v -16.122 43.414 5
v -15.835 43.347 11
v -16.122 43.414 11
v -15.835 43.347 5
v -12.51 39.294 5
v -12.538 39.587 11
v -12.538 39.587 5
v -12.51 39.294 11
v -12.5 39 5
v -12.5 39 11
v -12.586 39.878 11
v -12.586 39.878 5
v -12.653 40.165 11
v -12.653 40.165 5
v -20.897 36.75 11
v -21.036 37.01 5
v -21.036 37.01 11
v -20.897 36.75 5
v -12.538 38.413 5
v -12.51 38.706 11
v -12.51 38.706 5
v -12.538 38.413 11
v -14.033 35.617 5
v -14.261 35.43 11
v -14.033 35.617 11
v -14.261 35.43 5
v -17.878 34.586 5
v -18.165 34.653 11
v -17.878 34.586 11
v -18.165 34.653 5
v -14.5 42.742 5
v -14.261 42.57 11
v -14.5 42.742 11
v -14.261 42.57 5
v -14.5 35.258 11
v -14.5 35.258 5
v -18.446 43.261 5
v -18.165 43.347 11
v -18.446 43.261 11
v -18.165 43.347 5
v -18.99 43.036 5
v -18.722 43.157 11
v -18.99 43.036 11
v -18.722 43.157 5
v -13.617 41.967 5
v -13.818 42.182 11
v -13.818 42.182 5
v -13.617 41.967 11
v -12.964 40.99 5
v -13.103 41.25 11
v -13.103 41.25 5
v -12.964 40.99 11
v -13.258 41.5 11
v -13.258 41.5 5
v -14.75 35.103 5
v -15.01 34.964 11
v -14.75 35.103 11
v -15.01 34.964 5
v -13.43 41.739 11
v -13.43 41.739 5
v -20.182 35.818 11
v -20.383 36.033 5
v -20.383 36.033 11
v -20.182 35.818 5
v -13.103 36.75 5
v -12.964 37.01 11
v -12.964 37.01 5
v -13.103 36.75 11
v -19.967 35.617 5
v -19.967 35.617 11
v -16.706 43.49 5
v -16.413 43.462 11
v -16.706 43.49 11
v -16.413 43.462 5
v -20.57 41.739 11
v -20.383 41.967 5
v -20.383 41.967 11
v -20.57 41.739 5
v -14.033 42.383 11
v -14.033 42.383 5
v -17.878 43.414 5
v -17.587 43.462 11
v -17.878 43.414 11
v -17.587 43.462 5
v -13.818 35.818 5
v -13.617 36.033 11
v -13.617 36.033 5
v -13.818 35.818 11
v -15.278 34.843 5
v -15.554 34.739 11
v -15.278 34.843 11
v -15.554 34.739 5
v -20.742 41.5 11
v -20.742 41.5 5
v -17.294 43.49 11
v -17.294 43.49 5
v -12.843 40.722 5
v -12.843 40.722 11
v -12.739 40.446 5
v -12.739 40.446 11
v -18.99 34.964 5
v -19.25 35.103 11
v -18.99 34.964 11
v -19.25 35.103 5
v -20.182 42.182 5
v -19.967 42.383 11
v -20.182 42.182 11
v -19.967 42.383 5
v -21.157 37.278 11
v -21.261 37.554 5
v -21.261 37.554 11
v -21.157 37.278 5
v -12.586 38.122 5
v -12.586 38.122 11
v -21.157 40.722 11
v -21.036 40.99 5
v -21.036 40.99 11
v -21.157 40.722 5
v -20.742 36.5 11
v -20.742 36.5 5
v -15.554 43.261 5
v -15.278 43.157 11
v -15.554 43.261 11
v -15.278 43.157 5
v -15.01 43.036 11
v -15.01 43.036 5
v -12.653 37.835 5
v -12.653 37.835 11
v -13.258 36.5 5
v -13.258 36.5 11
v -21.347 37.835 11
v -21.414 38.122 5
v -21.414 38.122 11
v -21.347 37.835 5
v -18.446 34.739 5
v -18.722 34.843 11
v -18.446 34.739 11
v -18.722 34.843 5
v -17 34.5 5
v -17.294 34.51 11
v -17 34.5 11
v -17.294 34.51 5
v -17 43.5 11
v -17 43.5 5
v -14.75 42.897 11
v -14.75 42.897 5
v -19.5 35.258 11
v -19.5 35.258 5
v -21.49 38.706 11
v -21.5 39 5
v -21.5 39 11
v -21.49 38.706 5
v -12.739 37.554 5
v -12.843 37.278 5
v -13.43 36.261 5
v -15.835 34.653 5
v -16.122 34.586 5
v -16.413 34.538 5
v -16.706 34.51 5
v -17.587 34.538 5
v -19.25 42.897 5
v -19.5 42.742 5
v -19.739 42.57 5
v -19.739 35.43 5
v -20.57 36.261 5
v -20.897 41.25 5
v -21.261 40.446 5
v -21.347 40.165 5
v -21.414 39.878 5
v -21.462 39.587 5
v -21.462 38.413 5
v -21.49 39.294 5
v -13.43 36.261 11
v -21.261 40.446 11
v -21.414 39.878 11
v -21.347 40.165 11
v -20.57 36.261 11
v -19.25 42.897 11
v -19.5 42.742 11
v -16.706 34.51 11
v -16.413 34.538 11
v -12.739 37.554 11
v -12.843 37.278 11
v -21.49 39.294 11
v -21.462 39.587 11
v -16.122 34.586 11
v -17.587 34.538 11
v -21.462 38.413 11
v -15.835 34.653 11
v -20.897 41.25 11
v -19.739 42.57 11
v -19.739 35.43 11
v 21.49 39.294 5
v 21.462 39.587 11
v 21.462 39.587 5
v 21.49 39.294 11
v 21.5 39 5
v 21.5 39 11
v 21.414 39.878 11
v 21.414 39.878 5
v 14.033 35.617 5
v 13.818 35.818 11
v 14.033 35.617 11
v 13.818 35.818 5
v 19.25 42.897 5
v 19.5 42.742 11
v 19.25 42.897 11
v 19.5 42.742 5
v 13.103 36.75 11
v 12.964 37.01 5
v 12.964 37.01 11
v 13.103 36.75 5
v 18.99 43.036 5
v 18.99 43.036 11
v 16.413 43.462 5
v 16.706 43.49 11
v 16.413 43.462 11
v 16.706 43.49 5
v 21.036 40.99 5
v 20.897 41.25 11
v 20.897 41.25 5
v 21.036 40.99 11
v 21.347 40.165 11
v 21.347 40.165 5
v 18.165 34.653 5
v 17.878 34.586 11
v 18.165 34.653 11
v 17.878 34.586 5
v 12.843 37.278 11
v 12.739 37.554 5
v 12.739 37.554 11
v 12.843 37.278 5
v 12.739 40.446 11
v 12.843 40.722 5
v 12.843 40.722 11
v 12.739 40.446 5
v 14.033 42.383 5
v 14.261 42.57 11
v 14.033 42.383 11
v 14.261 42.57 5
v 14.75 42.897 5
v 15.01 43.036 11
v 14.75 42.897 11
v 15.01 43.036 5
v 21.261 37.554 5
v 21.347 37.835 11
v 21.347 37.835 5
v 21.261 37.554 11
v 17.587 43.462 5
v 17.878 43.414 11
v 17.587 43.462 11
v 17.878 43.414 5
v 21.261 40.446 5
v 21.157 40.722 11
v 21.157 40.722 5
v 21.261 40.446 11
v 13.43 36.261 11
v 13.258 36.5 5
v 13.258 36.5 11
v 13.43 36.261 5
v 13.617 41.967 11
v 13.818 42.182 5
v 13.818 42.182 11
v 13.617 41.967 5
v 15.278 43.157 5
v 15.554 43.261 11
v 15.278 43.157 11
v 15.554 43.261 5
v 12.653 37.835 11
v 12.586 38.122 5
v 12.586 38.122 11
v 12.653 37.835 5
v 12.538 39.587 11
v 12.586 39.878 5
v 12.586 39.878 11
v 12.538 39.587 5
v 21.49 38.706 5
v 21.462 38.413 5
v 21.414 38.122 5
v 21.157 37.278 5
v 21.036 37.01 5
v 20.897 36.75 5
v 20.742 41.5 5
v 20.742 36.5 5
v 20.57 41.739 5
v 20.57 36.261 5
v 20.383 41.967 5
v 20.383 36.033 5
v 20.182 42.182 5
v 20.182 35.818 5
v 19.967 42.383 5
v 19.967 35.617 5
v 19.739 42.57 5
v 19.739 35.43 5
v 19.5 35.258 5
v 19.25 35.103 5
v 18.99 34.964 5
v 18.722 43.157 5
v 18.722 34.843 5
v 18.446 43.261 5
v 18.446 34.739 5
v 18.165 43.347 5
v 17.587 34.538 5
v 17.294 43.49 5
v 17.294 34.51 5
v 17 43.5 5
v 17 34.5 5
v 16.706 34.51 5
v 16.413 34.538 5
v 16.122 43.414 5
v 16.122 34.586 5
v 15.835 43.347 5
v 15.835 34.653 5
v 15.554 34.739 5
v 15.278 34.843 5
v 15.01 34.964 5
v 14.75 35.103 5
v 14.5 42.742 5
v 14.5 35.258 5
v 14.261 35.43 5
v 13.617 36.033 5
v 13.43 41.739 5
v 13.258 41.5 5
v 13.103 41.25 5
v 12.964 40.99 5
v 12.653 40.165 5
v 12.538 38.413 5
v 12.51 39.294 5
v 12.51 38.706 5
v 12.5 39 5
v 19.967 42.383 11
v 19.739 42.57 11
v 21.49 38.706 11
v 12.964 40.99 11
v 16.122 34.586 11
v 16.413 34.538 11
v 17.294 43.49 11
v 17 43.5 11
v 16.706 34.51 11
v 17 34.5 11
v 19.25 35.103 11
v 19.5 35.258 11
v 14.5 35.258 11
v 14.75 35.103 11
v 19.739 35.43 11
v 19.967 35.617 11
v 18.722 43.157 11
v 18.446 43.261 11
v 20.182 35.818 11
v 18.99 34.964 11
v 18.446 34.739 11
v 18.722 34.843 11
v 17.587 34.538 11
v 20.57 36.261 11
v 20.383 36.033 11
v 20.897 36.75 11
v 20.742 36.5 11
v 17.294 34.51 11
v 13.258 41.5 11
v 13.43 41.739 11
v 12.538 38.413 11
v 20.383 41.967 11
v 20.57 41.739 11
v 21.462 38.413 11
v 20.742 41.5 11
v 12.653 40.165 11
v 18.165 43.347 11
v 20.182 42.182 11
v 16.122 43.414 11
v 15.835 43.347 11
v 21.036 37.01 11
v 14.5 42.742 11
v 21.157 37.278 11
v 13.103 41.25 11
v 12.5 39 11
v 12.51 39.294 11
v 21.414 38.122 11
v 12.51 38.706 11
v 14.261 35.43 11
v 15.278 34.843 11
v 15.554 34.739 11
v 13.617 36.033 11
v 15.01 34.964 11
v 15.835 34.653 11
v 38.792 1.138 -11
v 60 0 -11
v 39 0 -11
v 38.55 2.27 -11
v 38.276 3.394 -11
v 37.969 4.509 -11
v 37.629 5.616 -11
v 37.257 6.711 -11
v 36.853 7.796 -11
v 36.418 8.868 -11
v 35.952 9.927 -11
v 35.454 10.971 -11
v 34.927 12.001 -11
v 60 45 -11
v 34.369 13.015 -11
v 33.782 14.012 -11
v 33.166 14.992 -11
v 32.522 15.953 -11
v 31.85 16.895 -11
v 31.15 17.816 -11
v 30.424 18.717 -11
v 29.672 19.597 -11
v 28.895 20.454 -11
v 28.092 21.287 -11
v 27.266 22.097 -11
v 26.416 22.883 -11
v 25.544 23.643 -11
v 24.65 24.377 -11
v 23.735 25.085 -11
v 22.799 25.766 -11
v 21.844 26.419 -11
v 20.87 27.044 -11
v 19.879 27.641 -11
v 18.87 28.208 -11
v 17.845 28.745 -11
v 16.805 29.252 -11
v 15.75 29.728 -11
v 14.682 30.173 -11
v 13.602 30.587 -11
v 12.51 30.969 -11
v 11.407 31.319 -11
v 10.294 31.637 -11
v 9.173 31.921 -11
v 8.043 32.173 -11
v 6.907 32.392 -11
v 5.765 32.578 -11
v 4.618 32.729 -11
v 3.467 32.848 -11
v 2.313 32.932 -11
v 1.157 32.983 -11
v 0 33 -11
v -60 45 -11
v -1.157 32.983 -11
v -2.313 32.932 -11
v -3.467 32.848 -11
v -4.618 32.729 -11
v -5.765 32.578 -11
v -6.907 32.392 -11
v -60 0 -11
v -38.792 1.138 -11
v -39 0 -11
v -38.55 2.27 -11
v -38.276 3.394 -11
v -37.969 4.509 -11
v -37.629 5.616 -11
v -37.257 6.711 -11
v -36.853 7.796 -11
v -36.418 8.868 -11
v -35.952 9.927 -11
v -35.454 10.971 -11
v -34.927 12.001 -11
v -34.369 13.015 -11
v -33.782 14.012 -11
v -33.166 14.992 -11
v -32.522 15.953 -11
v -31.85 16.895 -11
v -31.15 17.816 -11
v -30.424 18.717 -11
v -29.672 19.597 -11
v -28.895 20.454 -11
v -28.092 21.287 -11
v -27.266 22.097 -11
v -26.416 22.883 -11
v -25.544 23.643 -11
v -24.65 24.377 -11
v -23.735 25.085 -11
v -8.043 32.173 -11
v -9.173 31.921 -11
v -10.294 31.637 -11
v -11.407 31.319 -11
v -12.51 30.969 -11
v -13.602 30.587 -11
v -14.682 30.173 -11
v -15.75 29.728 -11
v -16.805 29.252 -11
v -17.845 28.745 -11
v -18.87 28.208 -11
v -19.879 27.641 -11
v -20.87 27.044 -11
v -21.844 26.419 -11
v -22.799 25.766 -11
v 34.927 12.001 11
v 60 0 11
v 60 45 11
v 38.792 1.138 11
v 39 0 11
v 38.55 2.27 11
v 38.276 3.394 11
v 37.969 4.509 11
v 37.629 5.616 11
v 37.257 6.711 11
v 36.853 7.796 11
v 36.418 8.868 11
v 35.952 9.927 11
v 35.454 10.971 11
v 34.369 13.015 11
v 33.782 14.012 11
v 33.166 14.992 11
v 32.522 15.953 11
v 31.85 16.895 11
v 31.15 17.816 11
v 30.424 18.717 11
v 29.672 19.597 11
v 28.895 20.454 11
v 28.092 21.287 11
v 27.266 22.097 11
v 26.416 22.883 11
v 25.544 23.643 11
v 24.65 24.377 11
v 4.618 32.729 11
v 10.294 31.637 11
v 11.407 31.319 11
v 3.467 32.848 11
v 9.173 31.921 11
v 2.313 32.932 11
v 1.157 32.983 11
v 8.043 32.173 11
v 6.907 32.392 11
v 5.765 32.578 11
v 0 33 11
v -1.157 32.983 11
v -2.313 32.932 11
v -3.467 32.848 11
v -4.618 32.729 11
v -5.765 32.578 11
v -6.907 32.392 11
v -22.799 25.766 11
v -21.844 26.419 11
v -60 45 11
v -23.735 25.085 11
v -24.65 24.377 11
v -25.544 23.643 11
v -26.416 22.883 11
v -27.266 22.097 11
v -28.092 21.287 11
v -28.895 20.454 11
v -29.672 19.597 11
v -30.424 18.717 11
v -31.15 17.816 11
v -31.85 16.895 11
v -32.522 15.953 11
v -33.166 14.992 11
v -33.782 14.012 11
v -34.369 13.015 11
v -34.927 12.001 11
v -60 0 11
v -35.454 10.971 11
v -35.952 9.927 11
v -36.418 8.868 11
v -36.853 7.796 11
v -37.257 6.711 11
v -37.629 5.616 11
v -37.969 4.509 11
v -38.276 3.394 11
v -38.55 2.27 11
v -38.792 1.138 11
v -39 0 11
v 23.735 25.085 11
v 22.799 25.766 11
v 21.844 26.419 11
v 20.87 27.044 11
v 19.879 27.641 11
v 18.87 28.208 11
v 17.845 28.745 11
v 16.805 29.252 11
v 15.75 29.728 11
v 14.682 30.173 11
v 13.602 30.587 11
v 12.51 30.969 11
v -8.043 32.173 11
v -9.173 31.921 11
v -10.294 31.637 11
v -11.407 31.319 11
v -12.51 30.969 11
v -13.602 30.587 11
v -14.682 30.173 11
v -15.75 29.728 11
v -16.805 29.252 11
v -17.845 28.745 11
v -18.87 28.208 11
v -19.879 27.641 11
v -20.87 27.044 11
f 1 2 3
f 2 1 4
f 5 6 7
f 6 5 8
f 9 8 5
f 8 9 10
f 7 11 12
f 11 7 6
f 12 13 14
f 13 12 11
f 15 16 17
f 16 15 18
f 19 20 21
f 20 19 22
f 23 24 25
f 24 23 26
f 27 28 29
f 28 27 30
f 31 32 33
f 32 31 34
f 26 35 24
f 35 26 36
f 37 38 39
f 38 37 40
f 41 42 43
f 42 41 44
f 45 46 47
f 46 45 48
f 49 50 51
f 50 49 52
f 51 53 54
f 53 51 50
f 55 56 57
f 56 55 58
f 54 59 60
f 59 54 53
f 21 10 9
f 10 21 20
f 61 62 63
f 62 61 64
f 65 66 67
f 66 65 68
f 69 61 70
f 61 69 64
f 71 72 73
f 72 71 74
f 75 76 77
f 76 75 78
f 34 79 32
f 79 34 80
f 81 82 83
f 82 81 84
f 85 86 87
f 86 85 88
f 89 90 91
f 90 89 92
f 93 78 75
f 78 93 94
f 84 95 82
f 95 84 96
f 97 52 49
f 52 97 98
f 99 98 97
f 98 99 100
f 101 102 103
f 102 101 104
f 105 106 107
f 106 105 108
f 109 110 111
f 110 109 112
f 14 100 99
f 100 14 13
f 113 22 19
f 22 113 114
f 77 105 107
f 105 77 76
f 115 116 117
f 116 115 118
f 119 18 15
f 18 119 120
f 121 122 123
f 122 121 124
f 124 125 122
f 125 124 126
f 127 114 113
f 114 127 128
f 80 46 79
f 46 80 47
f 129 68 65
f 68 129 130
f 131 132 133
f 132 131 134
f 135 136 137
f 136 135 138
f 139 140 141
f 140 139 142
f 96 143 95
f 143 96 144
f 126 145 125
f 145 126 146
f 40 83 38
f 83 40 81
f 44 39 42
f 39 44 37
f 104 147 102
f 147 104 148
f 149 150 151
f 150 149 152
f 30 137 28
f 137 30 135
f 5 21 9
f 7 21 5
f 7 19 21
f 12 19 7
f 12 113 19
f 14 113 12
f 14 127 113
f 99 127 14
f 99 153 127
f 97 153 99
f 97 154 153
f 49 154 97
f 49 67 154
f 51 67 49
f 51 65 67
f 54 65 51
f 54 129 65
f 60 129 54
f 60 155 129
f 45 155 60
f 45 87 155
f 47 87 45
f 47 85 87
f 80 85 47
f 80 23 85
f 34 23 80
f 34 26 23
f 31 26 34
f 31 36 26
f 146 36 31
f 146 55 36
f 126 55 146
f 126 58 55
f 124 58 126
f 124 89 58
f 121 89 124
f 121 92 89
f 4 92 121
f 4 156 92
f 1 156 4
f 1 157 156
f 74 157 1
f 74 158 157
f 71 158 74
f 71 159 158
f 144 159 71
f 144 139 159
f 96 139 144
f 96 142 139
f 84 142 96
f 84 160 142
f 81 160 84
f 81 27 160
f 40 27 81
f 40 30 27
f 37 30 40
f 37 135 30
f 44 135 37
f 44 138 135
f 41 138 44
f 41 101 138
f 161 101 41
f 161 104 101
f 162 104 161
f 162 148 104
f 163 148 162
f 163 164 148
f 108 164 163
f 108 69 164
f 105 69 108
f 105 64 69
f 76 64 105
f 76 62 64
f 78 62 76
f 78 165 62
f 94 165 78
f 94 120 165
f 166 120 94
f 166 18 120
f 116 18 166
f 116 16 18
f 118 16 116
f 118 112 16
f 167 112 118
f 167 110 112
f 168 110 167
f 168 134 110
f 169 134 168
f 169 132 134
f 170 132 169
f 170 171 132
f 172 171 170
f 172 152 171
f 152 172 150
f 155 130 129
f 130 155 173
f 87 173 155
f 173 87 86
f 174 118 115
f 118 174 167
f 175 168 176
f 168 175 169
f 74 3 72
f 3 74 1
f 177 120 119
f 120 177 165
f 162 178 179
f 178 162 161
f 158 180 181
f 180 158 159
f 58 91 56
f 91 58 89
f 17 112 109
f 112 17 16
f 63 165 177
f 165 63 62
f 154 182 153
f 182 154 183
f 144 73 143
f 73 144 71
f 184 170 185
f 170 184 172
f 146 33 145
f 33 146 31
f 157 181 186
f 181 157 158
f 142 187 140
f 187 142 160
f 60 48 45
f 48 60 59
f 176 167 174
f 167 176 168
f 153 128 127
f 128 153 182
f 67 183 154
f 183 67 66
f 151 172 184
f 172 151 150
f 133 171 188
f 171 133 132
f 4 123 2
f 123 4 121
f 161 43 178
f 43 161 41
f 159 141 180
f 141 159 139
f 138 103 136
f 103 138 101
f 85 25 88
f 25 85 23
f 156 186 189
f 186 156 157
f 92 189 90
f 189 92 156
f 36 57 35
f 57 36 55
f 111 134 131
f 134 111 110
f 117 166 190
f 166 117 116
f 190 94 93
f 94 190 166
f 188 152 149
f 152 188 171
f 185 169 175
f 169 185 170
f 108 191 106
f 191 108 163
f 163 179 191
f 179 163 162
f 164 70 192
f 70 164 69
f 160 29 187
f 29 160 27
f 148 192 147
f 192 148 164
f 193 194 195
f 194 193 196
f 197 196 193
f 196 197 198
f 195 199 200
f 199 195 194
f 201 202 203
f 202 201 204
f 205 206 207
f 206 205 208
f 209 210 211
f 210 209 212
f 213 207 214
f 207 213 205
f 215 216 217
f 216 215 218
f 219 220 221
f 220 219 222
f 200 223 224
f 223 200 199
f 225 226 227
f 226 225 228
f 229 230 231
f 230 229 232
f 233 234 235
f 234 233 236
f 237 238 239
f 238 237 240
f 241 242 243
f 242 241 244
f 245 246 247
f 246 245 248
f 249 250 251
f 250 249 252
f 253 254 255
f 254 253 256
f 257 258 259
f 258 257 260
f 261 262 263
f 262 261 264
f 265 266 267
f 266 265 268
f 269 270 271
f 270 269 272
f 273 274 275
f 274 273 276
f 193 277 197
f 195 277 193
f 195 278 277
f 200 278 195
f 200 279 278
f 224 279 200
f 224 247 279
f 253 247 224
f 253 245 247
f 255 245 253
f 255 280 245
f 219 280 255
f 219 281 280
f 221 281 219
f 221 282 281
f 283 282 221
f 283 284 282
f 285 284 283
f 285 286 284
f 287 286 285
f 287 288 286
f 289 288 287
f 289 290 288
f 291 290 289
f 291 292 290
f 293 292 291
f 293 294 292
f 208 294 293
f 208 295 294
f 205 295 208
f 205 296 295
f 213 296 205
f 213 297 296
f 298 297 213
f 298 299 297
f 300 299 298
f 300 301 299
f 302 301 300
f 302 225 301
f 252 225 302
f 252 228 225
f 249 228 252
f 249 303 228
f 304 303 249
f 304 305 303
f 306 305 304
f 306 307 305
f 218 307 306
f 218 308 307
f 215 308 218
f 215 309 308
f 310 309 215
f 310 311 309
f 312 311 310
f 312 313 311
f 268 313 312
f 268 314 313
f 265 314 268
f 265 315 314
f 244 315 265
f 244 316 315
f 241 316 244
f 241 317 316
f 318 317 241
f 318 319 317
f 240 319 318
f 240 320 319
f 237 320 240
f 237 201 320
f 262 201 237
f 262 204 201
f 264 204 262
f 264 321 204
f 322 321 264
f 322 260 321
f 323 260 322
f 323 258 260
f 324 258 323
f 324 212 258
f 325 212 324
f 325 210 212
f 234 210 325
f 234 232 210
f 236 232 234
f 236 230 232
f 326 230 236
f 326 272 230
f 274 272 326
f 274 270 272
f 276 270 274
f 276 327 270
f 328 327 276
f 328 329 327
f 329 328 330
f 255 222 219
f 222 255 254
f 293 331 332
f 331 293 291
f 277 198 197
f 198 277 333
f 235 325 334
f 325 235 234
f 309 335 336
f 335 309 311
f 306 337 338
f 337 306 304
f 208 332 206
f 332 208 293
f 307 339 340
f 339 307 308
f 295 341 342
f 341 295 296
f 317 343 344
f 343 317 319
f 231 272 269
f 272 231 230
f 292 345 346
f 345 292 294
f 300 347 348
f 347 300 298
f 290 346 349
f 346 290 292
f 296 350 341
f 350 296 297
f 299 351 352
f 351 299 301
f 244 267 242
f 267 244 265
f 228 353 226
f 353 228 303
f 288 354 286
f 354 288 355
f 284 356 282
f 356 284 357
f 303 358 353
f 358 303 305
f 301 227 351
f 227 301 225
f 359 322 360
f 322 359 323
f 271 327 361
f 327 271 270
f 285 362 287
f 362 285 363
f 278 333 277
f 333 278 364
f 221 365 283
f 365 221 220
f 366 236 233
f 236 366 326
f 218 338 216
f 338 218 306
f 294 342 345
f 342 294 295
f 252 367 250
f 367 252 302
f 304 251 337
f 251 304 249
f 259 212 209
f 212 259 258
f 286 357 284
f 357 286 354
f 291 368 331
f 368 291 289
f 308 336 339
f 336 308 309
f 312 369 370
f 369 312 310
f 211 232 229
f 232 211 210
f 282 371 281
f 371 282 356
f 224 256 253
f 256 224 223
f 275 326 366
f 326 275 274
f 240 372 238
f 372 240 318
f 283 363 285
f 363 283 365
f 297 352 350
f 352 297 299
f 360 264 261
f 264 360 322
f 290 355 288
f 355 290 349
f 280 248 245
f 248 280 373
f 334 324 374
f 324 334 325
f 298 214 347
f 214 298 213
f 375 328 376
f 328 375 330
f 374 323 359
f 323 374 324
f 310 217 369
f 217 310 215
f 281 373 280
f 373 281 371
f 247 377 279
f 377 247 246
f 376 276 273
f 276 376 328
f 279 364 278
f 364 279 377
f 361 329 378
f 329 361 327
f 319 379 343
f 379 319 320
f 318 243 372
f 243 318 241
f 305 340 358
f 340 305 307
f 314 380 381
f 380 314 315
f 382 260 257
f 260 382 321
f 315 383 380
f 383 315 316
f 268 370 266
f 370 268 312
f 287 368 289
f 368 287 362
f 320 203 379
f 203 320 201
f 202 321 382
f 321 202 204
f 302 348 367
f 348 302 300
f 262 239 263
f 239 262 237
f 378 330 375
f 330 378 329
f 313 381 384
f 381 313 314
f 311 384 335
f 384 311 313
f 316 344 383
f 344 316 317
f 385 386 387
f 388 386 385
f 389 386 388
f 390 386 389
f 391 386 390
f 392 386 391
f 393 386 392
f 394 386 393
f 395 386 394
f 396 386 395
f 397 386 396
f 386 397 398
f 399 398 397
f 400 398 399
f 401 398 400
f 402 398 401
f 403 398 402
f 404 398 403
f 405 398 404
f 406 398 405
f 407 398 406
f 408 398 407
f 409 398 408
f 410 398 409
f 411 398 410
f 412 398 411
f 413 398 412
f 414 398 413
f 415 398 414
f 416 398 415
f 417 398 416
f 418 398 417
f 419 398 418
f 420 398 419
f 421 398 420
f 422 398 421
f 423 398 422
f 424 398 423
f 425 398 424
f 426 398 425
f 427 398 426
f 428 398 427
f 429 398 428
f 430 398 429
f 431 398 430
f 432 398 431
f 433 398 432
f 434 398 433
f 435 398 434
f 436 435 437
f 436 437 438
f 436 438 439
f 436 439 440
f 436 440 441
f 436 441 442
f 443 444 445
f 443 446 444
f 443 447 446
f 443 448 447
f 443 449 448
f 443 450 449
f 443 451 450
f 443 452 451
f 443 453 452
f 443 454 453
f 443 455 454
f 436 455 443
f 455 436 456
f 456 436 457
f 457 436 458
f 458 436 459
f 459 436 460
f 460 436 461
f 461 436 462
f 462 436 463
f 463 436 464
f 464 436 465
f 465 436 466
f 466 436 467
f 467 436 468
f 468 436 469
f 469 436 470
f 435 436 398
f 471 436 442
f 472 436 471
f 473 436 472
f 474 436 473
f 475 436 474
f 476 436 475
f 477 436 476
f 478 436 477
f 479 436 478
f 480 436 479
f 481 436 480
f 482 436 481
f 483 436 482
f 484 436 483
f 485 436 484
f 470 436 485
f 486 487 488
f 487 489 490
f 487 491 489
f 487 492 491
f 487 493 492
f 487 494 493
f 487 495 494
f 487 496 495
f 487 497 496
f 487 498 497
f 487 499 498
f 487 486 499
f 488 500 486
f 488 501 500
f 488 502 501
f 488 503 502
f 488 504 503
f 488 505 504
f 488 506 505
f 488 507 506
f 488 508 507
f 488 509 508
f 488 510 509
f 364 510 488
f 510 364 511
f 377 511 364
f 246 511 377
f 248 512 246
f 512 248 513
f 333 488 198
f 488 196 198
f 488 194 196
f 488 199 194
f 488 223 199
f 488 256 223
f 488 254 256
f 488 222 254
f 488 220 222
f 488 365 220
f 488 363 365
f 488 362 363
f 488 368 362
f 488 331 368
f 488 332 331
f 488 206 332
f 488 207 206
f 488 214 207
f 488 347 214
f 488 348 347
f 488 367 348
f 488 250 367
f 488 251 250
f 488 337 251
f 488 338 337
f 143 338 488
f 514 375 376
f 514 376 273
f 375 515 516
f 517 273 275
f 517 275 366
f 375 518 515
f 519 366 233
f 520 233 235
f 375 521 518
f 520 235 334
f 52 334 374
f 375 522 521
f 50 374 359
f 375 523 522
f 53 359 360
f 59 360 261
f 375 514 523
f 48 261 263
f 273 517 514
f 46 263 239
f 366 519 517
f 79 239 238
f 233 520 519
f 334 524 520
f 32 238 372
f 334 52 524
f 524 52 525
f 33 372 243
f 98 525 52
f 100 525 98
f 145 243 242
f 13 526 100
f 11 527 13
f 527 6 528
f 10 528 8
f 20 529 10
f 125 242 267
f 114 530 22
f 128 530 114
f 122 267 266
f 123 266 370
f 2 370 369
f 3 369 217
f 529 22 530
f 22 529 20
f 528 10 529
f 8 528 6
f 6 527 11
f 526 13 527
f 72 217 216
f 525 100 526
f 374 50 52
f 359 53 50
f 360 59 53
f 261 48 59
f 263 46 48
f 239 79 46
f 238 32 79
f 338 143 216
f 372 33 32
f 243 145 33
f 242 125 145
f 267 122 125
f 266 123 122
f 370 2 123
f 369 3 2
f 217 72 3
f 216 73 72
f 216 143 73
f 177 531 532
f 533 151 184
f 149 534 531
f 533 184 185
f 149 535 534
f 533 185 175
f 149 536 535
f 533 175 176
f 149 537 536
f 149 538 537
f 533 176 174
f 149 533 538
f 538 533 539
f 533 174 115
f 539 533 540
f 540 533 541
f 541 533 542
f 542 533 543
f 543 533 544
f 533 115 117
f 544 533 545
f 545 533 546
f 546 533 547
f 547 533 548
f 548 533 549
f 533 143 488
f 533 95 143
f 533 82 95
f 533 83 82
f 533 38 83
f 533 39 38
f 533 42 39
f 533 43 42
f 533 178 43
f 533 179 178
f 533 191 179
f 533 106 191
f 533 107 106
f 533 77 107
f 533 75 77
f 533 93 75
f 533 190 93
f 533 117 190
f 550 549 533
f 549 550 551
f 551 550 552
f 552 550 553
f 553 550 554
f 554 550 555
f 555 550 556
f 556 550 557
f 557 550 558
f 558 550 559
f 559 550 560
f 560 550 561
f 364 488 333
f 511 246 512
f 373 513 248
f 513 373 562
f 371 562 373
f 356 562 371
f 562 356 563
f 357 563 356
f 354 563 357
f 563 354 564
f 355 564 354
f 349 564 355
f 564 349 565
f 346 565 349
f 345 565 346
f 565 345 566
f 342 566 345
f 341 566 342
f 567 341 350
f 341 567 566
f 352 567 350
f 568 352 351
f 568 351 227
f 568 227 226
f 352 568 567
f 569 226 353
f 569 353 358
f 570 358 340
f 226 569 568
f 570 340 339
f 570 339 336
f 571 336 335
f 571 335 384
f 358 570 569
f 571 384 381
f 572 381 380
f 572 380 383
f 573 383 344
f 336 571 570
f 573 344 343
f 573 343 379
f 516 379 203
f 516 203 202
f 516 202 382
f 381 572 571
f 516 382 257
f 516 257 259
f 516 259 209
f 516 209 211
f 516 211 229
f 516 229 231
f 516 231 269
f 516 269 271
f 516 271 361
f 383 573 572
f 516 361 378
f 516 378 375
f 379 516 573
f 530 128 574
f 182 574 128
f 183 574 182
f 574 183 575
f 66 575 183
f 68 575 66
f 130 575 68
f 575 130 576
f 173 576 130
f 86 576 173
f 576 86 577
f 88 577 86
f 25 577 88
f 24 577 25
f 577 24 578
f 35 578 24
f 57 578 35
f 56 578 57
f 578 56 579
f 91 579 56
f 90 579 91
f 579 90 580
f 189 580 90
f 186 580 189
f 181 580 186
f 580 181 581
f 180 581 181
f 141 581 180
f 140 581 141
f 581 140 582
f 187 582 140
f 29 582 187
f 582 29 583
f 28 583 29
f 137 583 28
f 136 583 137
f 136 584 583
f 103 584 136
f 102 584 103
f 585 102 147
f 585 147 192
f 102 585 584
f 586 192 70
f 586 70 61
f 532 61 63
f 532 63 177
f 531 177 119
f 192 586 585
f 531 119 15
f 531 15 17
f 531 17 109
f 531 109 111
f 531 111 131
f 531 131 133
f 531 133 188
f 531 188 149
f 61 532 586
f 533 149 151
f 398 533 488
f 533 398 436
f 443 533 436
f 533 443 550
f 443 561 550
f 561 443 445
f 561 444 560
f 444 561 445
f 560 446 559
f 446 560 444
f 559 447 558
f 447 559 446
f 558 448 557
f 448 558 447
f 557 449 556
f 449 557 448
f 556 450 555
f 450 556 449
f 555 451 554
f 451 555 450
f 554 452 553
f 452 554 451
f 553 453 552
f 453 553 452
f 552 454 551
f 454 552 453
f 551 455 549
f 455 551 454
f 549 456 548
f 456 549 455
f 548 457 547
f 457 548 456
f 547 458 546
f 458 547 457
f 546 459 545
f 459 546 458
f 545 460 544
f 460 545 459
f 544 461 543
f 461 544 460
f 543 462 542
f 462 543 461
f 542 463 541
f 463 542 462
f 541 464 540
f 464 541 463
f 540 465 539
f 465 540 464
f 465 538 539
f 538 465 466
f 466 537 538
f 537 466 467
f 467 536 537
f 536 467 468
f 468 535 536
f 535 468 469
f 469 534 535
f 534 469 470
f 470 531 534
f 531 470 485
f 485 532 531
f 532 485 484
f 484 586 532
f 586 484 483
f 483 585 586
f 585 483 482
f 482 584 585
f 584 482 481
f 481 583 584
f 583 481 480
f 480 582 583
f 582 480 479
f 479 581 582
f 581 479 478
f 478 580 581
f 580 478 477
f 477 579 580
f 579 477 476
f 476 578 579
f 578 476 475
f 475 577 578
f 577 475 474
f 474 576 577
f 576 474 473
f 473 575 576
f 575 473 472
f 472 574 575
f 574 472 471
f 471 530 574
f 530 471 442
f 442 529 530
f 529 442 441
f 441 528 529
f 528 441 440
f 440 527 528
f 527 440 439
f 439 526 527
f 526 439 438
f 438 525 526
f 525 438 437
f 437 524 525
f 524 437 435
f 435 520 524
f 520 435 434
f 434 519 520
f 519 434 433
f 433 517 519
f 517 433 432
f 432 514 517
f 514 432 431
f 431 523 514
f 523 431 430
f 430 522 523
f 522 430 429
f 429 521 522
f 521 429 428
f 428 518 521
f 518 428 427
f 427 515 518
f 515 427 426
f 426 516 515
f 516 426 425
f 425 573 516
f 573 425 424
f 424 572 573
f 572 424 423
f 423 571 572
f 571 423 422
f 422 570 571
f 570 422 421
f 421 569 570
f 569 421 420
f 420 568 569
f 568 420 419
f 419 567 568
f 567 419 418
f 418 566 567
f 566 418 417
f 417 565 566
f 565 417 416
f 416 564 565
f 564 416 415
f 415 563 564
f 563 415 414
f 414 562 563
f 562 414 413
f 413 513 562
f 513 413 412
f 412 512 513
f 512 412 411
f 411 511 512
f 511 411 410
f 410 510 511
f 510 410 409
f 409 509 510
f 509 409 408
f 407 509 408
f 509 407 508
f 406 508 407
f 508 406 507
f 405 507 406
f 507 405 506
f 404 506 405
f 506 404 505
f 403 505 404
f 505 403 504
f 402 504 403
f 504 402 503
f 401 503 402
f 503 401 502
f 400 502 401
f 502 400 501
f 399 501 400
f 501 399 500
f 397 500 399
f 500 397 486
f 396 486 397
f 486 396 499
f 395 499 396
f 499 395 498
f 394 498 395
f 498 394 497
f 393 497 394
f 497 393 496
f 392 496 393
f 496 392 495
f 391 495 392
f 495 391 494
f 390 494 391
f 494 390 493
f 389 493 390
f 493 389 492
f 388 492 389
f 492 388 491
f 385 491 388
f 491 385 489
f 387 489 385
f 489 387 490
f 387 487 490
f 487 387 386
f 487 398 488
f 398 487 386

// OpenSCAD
// Parameters (mm)
curve_fragments = 96;
$fn = curve_fragments;

body_length = 120;
body_height = 45;
body_depth = 22;

top_slab_thickness = 12;

arch_span = 78;
arch_spring_height = 0;
arch_segments = 96;

recess_diameter = 9;
recess_depth = 6;
recess_spacing = 34;
recess_center_y = body_height - top_slab_thickness / 2;

cut_clearance = 0.05;

// Derived arch dimensions
arch_crown_y = body_height - top_slab_thickness;
arch_rise = arch_crown_y - arch_spring_height;
arch_radius = (arch_span * arch_span) / (8 * arch_rise) + arch_rise / 2;
arch_center_y = arch_crown_y - arch_radius;
arch_start_angle = atan2(arch_spring_height - arch_center_y, arch_span / 2);
arch_end_angle = 180 - arch_start_angle;

// Arc point list for the curved underside void
function arch_arc_points(n) =
    [for (i = [0 : n])
        [
            arch_radius * cos(arch_start_angle + (arch_end_angle - arch_start_angle) * i / n),
            arch_center_y + arch_radius * sin(arch_start_angle + (arch_end_angle - arch_start_angle) * i / n)
        ]
    ];

// Curved underside void profile
module arch_void_2d() {
    polygon(
        points = concat(
            [
                [-arch_span / 2, -cut_clearance],
                [ arch_span / 2, -cut_clearance]
            ],
            arch_arc_points(arch_segments)
        )
    );
}

// Single arched body outline
module body_profile_2d() {
    difference() {
        translate([-body_length / 2, 0])
            square([body_length, body_height], center=false);

        arch_void_2d();
    }
}

// Main solid extrusion
module arched_body() {
    linear_extrude(height=body_depth, center=true, convexity=10)
        body_profile_2d();
}

// Shallow blind circular recess from the front face
module circular_recess(x_pos) {
    translate([
        x_pos,
        recess_center_y,
        body_depth / 2 - recess_depth / 2 + cut_clearance / 2
    ])
        cylinder(h=recess_depth + cut_clearance, d=recess_diameter, center=true);
}

// Paired upper circular removal pattern
module paired_recesses() {
    for (x_pos = [-recess_spacing / 2, recess_spacing / 2])
        circular_recess(x_pos);
}

// Final model
difference() {
    arched_body();
    paired_recesses();
}
